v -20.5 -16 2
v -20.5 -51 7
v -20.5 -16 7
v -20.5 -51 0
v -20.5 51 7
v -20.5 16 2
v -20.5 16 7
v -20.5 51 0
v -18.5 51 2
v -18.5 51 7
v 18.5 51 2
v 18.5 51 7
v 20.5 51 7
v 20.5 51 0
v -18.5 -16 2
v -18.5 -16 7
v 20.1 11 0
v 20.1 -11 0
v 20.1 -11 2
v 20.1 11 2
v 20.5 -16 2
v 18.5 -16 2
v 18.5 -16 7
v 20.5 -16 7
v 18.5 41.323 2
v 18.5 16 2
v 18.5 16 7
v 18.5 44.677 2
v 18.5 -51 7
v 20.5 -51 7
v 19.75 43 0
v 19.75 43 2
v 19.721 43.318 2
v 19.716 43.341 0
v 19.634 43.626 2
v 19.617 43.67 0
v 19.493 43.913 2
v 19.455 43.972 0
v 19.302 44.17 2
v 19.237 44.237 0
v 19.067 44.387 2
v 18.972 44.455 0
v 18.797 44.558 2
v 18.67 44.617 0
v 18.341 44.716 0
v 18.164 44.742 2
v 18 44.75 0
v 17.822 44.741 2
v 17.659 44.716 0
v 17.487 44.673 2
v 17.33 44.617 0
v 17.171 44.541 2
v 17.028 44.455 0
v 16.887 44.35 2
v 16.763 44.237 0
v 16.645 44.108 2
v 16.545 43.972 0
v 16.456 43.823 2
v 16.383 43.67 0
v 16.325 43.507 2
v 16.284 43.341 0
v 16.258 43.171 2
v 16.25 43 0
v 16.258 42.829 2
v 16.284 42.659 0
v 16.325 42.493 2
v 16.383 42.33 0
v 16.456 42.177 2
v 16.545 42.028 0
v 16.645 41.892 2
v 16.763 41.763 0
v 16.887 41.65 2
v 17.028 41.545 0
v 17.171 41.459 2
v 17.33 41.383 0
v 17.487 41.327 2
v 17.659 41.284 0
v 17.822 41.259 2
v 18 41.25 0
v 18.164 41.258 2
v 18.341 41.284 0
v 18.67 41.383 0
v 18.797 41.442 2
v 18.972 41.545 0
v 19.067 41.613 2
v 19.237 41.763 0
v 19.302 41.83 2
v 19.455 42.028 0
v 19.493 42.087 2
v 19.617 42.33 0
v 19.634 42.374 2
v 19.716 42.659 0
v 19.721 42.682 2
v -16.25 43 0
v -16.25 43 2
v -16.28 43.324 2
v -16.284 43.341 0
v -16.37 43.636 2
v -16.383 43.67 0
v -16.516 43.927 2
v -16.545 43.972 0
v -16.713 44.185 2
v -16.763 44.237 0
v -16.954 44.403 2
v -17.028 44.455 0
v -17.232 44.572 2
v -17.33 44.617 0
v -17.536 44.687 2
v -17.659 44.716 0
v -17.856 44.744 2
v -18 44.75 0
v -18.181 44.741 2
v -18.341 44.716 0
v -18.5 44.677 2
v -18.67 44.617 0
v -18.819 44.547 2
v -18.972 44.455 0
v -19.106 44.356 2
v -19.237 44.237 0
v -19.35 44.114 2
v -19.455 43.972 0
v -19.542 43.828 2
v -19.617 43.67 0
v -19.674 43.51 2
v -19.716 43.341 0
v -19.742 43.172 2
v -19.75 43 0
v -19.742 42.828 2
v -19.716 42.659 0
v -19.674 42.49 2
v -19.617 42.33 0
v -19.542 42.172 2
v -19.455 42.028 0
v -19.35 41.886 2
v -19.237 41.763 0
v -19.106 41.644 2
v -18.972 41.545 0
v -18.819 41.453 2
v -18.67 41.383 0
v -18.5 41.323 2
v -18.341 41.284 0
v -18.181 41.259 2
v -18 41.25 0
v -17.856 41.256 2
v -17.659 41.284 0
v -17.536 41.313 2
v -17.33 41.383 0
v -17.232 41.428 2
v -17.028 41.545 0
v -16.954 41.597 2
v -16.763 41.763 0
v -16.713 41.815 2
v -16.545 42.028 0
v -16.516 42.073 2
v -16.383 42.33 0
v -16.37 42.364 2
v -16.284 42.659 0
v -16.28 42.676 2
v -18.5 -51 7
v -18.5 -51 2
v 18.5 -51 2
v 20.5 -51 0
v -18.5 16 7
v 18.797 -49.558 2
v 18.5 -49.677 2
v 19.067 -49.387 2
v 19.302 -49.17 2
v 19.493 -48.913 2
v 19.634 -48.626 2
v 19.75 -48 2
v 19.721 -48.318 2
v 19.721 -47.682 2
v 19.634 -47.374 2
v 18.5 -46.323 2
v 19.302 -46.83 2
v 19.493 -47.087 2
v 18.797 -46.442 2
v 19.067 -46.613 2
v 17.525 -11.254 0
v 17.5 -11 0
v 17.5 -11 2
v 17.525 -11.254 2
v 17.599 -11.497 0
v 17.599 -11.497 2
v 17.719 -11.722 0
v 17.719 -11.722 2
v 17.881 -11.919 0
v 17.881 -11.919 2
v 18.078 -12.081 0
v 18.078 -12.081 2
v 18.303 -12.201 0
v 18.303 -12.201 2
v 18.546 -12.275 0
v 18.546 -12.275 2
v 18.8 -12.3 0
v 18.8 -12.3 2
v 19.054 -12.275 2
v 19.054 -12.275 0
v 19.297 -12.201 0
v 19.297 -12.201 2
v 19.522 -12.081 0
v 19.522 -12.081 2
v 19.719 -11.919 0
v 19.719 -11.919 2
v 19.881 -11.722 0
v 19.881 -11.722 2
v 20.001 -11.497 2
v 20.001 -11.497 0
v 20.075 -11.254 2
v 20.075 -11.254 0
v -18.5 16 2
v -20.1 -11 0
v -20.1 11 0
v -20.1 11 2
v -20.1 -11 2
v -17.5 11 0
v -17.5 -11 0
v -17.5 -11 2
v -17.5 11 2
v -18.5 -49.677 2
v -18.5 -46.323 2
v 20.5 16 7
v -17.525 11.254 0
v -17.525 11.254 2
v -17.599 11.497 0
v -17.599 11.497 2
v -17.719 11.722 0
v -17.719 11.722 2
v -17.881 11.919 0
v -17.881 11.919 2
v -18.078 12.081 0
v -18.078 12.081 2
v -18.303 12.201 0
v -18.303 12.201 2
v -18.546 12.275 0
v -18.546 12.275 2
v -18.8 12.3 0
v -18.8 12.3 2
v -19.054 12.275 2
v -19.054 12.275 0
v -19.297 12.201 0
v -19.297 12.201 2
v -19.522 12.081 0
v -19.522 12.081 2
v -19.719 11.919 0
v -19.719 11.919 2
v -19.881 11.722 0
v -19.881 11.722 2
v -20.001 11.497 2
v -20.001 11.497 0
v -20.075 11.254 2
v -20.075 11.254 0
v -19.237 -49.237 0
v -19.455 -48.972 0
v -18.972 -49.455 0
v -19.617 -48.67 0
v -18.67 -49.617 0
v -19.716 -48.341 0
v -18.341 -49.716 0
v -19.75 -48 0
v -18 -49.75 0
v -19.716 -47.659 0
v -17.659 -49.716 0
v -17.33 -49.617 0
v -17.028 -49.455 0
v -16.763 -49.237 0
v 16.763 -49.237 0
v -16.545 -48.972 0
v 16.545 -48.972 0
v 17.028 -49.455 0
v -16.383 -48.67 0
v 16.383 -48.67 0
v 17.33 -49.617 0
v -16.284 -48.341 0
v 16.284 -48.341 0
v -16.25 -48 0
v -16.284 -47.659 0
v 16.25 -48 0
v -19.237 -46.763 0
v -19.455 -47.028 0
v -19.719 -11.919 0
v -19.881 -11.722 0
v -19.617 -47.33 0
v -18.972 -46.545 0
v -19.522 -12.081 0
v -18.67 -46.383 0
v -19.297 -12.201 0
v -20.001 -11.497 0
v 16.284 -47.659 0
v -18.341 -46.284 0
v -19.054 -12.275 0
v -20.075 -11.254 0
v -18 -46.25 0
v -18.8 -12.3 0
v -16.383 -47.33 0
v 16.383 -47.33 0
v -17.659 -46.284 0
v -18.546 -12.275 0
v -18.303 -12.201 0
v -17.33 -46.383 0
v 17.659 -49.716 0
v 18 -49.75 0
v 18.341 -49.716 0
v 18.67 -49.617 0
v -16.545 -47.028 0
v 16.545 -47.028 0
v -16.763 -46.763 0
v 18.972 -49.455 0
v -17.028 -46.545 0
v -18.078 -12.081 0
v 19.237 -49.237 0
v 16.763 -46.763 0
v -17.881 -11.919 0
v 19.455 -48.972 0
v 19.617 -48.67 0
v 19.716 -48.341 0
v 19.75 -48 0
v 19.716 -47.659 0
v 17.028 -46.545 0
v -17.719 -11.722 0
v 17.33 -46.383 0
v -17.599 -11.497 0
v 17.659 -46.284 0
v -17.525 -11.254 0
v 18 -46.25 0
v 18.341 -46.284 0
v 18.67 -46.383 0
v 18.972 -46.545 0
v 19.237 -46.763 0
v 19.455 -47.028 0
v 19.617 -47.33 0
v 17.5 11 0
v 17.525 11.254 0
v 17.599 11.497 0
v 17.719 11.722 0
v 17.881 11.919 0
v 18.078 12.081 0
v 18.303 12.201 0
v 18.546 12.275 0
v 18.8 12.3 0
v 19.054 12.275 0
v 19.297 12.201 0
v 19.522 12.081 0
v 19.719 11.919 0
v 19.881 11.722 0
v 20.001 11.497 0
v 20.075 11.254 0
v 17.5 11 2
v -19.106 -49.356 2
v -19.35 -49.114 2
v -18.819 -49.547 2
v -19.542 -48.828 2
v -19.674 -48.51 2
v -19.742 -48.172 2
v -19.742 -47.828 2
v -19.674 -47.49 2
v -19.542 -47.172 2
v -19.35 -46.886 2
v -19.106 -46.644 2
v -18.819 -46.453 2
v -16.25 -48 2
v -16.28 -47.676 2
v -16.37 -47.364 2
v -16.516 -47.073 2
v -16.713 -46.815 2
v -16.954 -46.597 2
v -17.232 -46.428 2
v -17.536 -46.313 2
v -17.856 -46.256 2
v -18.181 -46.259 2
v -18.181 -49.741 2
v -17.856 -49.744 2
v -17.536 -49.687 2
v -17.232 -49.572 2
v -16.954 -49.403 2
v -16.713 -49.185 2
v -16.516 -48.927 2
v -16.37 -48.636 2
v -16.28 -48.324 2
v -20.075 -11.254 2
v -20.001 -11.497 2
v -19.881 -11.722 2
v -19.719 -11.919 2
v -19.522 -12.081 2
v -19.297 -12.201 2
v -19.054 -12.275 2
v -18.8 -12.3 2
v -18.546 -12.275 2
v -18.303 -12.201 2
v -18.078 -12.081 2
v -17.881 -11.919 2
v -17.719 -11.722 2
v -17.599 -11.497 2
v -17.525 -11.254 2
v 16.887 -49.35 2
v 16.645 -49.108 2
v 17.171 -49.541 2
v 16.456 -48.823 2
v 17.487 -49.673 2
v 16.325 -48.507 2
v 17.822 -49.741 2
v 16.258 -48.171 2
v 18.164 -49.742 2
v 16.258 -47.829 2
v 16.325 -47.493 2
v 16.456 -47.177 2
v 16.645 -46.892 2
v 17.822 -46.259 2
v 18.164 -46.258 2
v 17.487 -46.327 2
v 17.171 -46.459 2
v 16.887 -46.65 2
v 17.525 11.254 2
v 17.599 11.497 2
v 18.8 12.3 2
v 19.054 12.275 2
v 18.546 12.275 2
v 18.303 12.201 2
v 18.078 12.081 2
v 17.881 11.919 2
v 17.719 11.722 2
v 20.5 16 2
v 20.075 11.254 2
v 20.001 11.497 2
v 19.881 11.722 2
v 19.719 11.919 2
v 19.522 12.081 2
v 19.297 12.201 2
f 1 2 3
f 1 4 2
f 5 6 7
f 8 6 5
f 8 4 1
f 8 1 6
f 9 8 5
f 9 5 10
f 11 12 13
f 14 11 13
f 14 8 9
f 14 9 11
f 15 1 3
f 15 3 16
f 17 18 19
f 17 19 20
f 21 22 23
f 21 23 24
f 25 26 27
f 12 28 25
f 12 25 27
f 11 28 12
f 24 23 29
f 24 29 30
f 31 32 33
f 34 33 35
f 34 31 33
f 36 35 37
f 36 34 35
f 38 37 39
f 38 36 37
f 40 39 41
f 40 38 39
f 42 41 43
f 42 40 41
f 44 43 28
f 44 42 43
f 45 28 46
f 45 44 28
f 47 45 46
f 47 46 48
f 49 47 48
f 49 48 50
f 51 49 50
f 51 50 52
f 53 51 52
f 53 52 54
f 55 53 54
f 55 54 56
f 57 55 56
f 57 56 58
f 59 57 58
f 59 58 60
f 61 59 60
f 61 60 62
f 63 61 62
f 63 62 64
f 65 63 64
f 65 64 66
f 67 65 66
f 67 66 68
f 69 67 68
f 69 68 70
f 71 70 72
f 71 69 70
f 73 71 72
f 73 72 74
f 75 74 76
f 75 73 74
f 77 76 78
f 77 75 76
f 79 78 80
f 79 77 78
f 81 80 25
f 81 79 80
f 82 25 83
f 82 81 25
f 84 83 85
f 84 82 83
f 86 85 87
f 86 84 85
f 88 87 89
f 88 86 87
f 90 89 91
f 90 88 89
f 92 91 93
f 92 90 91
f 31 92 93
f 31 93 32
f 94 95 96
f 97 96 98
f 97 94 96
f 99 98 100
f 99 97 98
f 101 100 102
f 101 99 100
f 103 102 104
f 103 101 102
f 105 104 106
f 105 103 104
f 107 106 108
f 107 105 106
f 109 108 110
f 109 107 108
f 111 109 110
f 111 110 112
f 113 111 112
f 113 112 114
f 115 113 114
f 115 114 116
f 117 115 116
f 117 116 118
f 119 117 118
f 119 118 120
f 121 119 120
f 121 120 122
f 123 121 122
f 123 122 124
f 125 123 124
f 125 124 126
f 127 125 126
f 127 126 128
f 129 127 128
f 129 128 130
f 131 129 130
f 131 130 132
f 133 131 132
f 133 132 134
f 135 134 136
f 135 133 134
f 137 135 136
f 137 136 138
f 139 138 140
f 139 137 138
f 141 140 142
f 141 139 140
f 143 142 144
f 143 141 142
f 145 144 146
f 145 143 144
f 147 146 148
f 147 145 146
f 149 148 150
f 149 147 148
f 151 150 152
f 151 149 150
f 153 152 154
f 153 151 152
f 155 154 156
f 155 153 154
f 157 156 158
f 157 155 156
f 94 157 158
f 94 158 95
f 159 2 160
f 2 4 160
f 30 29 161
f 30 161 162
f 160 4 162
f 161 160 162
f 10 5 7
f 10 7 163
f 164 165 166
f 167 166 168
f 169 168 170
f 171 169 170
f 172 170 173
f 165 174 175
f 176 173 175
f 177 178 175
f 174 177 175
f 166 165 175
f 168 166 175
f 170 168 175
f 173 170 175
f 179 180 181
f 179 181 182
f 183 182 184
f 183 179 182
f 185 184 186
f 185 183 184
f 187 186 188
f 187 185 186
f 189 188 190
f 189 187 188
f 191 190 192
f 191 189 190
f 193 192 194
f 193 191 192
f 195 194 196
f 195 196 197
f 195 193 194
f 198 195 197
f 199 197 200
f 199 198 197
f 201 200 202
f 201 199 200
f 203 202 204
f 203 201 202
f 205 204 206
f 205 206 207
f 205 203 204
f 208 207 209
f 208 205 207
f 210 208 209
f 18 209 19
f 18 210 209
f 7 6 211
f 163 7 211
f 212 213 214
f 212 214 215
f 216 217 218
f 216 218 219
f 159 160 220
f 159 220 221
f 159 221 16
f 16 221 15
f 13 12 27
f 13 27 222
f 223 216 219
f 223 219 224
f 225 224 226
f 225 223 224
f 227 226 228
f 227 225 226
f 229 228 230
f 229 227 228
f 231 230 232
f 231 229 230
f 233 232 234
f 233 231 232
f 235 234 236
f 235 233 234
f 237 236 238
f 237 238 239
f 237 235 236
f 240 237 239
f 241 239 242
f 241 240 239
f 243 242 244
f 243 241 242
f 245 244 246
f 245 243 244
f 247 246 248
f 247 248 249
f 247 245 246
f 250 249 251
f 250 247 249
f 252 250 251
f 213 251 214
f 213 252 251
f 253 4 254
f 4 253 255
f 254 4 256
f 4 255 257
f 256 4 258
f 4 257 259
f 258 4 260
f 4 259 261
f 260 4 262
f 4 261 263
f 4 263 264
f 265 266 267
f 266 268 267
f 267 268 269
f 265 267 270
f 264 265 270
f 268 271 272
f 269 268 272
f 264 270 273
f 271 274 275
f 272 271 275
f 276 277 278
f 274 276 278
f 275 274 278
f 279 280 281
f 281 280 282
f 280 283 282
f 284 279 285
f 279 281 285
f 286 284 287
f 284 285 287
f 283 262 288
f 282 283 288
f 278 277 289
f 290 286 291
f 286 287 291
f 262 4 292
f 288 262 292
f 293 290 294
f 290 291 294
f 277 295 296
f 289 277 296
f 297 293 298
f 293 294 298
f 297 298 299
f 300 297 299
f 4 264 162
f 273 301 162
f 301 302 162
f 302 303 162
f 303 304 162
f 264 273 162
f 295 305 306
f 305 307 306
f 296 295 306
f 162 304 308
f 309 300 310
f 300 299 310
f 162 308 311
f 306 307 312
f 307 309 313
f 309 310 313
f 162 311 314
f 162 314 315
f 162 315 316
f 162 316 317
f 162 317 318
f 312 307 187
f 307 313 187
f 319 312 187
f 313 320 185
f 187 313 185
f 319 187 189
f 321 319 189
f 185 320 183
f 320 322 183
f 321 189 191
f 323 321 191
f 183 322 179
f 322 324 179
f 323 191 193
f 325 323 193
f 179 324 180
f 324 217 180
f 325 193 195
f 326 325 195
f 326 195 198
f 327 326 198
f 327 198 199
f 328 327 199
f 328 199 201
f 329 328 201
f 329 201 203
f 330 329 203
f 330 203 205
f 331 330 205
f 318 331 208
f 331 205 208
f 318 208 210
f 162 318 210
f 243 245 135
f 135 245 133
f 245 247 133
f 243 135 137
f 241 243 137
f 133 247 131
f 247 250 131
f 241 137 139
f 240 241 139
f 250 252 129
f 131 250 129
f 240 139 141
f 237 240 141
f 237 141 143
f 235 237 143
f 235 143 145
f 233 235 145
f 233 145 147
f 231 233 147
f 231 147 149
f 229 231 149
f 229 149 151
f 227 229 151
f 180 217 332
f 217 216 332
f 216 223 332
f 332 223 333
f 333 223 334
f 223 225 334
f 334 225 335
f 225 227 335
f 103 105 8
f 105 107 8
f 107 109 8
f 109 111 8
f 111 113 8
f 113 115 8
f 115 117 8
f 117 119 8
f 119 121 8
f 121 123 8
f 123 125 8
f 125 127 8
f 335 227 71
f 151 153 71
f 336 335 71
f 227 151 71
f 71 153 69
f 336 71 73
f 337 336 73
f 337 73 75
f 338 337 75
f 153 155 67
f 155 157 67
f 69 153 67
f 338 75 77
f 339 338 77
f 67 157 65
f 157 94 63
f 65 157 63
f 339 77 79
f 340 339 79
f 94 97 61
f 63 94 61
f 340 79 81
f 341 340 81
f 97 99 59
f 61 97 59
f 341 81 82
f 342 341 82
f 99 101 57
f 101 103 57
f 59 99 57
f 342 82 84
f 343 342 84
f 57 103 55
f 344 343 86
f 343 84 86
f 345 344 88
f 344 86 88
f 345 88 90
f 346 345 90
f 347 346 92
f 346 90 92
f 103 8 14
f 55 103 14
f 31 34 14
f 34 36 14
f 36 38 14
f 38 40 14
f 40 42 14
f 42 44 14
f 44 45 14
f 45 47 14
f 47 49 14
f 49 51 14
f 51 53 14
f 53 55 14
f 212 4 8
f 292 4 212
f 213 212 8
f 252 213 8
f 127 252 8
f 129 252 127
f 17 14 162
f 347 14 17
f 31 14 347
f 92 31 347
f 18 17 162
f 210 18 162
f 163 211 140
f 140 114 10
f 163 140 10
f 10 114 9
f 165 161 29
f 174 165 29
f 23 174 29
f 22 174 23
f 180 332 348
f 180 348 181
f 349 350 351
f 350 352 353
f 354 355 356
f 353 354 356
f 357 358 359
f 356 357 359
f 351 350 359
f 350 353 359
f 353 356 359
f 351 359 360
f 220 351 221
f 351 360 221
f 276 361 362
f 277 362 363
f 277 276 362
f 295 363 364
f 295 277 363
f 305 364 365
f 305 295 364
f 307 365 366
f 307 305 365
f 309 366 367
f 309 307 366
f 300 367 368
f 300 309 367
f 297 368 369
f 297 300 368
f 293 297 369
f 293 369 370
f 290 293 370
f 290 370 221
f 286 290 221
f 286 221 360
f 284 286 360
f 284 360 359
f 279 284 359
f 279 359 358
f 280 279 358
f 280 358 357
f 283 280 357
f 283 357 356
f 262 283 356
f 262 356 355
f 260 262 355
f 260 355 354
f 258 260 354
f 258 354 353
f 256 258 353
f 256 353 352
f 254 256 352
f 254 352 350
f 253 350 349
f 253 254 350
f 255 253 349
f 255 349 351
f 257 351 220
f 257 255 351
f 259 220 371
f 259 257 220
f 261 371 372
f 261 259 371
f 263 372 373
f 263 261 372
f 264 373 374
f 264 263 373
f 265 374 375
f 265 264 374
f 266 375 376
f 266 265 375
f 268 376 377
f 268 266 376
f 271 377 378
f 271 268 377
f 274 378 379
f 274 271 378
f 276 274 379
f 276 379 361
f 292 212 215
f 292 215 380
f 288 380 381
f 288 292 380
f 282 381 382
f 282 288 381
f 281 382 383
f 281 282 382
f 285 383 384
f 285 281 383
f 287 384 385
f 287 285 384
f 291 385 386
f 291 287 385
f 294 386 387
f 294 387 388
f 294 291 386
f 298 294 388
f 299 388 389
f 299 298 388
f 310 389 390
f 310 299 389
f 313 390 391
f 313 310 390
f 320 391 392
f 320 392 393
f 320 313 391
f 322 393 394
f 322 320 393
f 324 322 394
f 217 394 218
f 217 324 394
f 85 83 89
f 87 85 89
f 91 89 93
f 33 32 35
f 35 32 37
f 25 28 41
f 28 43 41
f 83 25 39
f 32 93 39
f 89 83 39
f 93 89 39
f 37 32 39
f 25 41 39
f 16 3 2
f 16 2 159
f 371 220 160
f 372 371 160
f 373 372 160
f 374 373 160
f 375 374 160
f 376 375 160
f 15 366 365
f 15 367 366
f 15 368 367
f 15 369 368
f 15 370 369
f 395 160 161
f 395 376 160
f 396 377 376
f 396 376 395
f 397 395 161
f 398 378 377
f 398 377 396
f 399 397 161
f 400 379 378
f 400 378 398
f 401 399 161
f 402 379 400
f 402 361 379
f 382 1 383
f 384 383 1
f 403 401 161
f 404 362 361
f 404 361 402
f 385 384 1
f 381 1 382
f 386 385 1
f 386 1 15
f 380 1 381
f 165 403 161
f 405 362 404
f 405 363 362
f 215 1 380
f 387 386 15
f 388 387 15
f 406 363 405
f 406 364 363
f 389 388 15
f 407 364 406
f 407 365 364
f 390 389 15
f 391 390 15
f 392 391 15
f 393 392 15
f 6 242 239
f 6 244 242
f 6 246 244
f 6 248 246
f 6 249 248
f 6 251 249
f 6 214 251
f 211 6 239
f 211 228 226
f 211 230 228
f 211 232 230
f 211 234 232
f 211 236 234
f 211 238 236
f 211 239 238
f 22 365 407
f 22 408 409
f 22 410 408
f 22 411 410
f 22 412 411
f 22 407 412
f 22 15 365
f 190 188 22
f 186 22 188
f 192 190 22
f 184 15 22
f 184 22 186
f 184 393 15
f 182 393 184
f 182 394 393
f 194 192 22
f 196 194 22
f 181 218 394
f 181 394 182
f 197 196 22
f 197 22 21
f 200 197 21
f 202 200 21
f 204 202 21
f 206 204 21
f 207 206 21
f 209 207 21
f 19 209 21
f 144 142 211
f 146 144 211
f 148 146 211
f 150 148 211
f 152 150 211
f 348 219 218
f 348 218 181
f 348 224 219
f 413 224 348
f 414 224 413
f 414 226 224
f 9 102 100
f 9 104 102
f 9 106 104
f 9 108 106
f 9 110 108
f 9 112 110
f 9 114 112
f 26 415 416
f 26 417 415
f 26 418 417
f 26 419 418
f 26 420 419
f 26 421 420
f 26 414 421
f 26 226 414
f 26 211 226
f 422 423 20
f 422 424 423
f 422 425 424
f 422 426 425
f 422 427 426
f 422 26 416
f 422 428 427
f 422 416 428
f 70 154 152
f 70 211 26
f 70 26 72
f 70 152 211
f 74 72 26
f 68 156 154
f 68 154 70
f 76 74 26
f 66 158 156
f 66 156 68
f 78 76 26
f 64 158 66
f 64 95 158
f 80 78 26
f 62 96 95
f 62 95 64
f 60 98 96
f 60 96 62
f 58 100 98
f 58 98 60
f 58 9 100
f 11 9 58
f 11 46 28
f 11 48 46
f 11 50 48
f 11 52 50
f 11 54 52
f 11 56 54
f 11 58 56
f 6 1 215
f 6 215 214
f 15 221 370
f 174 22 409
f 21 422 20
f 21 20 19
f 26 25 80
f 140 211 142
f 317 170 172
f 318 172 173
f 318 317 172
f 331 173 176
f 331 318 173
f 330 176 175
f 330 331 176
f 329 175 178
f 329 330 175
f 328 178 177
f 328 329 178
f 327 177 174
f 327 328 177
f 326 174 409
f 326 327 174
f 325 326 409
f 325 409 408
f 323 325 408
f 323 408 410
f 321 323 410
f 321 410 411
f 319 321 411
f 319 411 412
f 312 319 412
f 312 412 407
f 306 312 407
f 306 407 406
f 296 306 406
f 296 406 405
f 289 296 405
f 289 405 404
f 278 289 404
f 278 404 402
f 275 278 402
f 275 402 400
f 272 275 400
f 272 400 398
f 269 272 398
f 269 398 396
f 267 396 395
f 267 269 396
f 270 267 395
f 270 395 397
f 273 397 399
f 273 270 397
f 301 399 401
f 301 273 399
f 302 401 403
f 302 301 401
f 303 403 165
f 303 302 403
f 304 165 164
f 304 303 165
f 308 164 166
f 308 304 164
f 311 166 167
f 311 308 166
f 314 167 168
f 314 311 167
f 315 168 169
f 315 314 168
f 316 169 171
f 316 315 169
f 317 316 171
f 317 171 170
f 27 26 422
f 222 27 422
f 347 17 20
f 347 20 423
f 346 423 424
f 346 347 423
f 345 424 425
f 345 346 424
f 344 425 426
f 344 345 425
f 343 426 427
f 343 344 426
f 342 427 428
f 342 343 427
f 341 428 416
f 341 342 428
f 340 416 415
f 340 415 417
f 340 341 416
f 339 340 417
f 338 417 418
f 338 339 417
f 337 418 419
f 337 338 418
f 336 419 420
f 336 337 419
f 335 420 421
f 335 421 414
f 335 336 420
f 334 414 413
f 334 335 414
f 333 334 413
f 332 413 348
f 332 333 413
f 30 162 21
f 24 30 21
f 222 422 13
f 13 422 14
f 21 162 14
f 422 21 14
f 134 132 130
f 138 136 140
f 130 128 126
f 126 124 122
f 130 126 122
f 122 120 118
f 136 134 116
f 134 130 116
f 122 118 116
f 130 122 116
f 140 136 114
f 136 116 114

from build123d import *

# Parameters (mm, degrees)
FLOOR_AND_STRAP_GUIDES_PROFILE_W = 41
FLOOR_AND_STRAP_GUIDES_PROFILE_H = 102
FLOOR_AND_STRAP_GUIDES_PROFILE_R = 1.75
FLOOR_AND_STRAP_GUIDES_DEPTH     = 2
INTEGRAL_START                   = 2
INTEGRAL_EDGE_STOPS_PROFILE_W    = 2
INTEGRAL_EDGE_STOPS_PROFILE_H    = 35
INTEGRAL_EDGE_STOPS_DEPTH        = 5


with BuildPart() as part:
    # Floor and strap guides profile → Floor and strap guides (new body)
    with BuildSketch(Plane.XY):
        Rectangle(FLOOR_AND_STRAP_GUIDES_PROFILE_W, FLOOR_AND_STRAP_GUIDES_PROFILE_H)
        with Locations((-18, -48)):
            Circle(FLOOR_AND_STRAP_GUIDES_PROFILE_R, mode=Mode.SUBTRACT)
        with Locations((-18, 43)):
            Circle(FLOOR_AND_STRAP_GUIDES_PROFILE_R, mode=Mode.SUBTRACT)
        with Locations((18, -48)):
            Circle(FLOOR_AND_STRAP_GUIDES_PROFILE_R, mode=Mode.SUBTRACT)
        with Locations((18, 43)):
            Circle(FLOOR_AND_STRAP_GUIDES_PROFILE_R, mode=Mode.SUBTRACT)
        with BuildLine():
            Line((-17.5, -11), (-17.5, 11))
            ThreePointArc((-17.5, 11), (-18.8, 12.3), (-20.1, 11))
            Line((-20.1, 11), (-20.1, -11))
            ThreePointArc((-20.1, -11), (-18.8, -12.3), (-17.5, -11))
        make_face(mode=Mode.SUBTRACT)
        with BuildLine():
            Line((20.1, -11), (20.1, 11))
            ThreePointArc((20.1, 11), (18.8, 12.3), (17.5, 11))
            Line((17.5, 11), (17.5, -11))
            ThreePointArc((17.5, -11), (18.8, -12.3), (20.1, -11))
        make_face(mode=Mode.SUBTRACT)
    extrude(amount=FLOOR_AND_STRAP_GUIDES_DEPTH)

    # Integral edge stops profile → Integral edge stops (add)
    with BuildSketch(Plane.XY.offset(INTEGRAL_START)):
        with Locations((-19.5, -33.5)):
            Rectangle(INTEGRAL_EDGE_STOPS_PROFILE_W, INTEGRAL_EDGE_STOPS_PROFILE_H)
        with Locations((19.5, -33.5)):
            Rectangle(INTEGRAL_EDGE_STOPS_PROFILE_W, INTEGRAL_EDGE_STOPS_PROFILE_H)
        with Locations((-19.5, 33.5)):
            Rectangle(INTEGRAL_EDGE_STOPS_PROFILE_W, INTEGRAL_EDGE_STOPS_PROFILE_H)
        with Locations((19.5, 33.5)):
            Rectangle(INTEGRAL_EDGE_STOPS_PROFILE_W, INTEGRAL_EDGE_STOPS_PROFILE_H)
    extrude(amount=INTEGRAL_EDGE_STOPS_DEPTH)


solid = part.part
